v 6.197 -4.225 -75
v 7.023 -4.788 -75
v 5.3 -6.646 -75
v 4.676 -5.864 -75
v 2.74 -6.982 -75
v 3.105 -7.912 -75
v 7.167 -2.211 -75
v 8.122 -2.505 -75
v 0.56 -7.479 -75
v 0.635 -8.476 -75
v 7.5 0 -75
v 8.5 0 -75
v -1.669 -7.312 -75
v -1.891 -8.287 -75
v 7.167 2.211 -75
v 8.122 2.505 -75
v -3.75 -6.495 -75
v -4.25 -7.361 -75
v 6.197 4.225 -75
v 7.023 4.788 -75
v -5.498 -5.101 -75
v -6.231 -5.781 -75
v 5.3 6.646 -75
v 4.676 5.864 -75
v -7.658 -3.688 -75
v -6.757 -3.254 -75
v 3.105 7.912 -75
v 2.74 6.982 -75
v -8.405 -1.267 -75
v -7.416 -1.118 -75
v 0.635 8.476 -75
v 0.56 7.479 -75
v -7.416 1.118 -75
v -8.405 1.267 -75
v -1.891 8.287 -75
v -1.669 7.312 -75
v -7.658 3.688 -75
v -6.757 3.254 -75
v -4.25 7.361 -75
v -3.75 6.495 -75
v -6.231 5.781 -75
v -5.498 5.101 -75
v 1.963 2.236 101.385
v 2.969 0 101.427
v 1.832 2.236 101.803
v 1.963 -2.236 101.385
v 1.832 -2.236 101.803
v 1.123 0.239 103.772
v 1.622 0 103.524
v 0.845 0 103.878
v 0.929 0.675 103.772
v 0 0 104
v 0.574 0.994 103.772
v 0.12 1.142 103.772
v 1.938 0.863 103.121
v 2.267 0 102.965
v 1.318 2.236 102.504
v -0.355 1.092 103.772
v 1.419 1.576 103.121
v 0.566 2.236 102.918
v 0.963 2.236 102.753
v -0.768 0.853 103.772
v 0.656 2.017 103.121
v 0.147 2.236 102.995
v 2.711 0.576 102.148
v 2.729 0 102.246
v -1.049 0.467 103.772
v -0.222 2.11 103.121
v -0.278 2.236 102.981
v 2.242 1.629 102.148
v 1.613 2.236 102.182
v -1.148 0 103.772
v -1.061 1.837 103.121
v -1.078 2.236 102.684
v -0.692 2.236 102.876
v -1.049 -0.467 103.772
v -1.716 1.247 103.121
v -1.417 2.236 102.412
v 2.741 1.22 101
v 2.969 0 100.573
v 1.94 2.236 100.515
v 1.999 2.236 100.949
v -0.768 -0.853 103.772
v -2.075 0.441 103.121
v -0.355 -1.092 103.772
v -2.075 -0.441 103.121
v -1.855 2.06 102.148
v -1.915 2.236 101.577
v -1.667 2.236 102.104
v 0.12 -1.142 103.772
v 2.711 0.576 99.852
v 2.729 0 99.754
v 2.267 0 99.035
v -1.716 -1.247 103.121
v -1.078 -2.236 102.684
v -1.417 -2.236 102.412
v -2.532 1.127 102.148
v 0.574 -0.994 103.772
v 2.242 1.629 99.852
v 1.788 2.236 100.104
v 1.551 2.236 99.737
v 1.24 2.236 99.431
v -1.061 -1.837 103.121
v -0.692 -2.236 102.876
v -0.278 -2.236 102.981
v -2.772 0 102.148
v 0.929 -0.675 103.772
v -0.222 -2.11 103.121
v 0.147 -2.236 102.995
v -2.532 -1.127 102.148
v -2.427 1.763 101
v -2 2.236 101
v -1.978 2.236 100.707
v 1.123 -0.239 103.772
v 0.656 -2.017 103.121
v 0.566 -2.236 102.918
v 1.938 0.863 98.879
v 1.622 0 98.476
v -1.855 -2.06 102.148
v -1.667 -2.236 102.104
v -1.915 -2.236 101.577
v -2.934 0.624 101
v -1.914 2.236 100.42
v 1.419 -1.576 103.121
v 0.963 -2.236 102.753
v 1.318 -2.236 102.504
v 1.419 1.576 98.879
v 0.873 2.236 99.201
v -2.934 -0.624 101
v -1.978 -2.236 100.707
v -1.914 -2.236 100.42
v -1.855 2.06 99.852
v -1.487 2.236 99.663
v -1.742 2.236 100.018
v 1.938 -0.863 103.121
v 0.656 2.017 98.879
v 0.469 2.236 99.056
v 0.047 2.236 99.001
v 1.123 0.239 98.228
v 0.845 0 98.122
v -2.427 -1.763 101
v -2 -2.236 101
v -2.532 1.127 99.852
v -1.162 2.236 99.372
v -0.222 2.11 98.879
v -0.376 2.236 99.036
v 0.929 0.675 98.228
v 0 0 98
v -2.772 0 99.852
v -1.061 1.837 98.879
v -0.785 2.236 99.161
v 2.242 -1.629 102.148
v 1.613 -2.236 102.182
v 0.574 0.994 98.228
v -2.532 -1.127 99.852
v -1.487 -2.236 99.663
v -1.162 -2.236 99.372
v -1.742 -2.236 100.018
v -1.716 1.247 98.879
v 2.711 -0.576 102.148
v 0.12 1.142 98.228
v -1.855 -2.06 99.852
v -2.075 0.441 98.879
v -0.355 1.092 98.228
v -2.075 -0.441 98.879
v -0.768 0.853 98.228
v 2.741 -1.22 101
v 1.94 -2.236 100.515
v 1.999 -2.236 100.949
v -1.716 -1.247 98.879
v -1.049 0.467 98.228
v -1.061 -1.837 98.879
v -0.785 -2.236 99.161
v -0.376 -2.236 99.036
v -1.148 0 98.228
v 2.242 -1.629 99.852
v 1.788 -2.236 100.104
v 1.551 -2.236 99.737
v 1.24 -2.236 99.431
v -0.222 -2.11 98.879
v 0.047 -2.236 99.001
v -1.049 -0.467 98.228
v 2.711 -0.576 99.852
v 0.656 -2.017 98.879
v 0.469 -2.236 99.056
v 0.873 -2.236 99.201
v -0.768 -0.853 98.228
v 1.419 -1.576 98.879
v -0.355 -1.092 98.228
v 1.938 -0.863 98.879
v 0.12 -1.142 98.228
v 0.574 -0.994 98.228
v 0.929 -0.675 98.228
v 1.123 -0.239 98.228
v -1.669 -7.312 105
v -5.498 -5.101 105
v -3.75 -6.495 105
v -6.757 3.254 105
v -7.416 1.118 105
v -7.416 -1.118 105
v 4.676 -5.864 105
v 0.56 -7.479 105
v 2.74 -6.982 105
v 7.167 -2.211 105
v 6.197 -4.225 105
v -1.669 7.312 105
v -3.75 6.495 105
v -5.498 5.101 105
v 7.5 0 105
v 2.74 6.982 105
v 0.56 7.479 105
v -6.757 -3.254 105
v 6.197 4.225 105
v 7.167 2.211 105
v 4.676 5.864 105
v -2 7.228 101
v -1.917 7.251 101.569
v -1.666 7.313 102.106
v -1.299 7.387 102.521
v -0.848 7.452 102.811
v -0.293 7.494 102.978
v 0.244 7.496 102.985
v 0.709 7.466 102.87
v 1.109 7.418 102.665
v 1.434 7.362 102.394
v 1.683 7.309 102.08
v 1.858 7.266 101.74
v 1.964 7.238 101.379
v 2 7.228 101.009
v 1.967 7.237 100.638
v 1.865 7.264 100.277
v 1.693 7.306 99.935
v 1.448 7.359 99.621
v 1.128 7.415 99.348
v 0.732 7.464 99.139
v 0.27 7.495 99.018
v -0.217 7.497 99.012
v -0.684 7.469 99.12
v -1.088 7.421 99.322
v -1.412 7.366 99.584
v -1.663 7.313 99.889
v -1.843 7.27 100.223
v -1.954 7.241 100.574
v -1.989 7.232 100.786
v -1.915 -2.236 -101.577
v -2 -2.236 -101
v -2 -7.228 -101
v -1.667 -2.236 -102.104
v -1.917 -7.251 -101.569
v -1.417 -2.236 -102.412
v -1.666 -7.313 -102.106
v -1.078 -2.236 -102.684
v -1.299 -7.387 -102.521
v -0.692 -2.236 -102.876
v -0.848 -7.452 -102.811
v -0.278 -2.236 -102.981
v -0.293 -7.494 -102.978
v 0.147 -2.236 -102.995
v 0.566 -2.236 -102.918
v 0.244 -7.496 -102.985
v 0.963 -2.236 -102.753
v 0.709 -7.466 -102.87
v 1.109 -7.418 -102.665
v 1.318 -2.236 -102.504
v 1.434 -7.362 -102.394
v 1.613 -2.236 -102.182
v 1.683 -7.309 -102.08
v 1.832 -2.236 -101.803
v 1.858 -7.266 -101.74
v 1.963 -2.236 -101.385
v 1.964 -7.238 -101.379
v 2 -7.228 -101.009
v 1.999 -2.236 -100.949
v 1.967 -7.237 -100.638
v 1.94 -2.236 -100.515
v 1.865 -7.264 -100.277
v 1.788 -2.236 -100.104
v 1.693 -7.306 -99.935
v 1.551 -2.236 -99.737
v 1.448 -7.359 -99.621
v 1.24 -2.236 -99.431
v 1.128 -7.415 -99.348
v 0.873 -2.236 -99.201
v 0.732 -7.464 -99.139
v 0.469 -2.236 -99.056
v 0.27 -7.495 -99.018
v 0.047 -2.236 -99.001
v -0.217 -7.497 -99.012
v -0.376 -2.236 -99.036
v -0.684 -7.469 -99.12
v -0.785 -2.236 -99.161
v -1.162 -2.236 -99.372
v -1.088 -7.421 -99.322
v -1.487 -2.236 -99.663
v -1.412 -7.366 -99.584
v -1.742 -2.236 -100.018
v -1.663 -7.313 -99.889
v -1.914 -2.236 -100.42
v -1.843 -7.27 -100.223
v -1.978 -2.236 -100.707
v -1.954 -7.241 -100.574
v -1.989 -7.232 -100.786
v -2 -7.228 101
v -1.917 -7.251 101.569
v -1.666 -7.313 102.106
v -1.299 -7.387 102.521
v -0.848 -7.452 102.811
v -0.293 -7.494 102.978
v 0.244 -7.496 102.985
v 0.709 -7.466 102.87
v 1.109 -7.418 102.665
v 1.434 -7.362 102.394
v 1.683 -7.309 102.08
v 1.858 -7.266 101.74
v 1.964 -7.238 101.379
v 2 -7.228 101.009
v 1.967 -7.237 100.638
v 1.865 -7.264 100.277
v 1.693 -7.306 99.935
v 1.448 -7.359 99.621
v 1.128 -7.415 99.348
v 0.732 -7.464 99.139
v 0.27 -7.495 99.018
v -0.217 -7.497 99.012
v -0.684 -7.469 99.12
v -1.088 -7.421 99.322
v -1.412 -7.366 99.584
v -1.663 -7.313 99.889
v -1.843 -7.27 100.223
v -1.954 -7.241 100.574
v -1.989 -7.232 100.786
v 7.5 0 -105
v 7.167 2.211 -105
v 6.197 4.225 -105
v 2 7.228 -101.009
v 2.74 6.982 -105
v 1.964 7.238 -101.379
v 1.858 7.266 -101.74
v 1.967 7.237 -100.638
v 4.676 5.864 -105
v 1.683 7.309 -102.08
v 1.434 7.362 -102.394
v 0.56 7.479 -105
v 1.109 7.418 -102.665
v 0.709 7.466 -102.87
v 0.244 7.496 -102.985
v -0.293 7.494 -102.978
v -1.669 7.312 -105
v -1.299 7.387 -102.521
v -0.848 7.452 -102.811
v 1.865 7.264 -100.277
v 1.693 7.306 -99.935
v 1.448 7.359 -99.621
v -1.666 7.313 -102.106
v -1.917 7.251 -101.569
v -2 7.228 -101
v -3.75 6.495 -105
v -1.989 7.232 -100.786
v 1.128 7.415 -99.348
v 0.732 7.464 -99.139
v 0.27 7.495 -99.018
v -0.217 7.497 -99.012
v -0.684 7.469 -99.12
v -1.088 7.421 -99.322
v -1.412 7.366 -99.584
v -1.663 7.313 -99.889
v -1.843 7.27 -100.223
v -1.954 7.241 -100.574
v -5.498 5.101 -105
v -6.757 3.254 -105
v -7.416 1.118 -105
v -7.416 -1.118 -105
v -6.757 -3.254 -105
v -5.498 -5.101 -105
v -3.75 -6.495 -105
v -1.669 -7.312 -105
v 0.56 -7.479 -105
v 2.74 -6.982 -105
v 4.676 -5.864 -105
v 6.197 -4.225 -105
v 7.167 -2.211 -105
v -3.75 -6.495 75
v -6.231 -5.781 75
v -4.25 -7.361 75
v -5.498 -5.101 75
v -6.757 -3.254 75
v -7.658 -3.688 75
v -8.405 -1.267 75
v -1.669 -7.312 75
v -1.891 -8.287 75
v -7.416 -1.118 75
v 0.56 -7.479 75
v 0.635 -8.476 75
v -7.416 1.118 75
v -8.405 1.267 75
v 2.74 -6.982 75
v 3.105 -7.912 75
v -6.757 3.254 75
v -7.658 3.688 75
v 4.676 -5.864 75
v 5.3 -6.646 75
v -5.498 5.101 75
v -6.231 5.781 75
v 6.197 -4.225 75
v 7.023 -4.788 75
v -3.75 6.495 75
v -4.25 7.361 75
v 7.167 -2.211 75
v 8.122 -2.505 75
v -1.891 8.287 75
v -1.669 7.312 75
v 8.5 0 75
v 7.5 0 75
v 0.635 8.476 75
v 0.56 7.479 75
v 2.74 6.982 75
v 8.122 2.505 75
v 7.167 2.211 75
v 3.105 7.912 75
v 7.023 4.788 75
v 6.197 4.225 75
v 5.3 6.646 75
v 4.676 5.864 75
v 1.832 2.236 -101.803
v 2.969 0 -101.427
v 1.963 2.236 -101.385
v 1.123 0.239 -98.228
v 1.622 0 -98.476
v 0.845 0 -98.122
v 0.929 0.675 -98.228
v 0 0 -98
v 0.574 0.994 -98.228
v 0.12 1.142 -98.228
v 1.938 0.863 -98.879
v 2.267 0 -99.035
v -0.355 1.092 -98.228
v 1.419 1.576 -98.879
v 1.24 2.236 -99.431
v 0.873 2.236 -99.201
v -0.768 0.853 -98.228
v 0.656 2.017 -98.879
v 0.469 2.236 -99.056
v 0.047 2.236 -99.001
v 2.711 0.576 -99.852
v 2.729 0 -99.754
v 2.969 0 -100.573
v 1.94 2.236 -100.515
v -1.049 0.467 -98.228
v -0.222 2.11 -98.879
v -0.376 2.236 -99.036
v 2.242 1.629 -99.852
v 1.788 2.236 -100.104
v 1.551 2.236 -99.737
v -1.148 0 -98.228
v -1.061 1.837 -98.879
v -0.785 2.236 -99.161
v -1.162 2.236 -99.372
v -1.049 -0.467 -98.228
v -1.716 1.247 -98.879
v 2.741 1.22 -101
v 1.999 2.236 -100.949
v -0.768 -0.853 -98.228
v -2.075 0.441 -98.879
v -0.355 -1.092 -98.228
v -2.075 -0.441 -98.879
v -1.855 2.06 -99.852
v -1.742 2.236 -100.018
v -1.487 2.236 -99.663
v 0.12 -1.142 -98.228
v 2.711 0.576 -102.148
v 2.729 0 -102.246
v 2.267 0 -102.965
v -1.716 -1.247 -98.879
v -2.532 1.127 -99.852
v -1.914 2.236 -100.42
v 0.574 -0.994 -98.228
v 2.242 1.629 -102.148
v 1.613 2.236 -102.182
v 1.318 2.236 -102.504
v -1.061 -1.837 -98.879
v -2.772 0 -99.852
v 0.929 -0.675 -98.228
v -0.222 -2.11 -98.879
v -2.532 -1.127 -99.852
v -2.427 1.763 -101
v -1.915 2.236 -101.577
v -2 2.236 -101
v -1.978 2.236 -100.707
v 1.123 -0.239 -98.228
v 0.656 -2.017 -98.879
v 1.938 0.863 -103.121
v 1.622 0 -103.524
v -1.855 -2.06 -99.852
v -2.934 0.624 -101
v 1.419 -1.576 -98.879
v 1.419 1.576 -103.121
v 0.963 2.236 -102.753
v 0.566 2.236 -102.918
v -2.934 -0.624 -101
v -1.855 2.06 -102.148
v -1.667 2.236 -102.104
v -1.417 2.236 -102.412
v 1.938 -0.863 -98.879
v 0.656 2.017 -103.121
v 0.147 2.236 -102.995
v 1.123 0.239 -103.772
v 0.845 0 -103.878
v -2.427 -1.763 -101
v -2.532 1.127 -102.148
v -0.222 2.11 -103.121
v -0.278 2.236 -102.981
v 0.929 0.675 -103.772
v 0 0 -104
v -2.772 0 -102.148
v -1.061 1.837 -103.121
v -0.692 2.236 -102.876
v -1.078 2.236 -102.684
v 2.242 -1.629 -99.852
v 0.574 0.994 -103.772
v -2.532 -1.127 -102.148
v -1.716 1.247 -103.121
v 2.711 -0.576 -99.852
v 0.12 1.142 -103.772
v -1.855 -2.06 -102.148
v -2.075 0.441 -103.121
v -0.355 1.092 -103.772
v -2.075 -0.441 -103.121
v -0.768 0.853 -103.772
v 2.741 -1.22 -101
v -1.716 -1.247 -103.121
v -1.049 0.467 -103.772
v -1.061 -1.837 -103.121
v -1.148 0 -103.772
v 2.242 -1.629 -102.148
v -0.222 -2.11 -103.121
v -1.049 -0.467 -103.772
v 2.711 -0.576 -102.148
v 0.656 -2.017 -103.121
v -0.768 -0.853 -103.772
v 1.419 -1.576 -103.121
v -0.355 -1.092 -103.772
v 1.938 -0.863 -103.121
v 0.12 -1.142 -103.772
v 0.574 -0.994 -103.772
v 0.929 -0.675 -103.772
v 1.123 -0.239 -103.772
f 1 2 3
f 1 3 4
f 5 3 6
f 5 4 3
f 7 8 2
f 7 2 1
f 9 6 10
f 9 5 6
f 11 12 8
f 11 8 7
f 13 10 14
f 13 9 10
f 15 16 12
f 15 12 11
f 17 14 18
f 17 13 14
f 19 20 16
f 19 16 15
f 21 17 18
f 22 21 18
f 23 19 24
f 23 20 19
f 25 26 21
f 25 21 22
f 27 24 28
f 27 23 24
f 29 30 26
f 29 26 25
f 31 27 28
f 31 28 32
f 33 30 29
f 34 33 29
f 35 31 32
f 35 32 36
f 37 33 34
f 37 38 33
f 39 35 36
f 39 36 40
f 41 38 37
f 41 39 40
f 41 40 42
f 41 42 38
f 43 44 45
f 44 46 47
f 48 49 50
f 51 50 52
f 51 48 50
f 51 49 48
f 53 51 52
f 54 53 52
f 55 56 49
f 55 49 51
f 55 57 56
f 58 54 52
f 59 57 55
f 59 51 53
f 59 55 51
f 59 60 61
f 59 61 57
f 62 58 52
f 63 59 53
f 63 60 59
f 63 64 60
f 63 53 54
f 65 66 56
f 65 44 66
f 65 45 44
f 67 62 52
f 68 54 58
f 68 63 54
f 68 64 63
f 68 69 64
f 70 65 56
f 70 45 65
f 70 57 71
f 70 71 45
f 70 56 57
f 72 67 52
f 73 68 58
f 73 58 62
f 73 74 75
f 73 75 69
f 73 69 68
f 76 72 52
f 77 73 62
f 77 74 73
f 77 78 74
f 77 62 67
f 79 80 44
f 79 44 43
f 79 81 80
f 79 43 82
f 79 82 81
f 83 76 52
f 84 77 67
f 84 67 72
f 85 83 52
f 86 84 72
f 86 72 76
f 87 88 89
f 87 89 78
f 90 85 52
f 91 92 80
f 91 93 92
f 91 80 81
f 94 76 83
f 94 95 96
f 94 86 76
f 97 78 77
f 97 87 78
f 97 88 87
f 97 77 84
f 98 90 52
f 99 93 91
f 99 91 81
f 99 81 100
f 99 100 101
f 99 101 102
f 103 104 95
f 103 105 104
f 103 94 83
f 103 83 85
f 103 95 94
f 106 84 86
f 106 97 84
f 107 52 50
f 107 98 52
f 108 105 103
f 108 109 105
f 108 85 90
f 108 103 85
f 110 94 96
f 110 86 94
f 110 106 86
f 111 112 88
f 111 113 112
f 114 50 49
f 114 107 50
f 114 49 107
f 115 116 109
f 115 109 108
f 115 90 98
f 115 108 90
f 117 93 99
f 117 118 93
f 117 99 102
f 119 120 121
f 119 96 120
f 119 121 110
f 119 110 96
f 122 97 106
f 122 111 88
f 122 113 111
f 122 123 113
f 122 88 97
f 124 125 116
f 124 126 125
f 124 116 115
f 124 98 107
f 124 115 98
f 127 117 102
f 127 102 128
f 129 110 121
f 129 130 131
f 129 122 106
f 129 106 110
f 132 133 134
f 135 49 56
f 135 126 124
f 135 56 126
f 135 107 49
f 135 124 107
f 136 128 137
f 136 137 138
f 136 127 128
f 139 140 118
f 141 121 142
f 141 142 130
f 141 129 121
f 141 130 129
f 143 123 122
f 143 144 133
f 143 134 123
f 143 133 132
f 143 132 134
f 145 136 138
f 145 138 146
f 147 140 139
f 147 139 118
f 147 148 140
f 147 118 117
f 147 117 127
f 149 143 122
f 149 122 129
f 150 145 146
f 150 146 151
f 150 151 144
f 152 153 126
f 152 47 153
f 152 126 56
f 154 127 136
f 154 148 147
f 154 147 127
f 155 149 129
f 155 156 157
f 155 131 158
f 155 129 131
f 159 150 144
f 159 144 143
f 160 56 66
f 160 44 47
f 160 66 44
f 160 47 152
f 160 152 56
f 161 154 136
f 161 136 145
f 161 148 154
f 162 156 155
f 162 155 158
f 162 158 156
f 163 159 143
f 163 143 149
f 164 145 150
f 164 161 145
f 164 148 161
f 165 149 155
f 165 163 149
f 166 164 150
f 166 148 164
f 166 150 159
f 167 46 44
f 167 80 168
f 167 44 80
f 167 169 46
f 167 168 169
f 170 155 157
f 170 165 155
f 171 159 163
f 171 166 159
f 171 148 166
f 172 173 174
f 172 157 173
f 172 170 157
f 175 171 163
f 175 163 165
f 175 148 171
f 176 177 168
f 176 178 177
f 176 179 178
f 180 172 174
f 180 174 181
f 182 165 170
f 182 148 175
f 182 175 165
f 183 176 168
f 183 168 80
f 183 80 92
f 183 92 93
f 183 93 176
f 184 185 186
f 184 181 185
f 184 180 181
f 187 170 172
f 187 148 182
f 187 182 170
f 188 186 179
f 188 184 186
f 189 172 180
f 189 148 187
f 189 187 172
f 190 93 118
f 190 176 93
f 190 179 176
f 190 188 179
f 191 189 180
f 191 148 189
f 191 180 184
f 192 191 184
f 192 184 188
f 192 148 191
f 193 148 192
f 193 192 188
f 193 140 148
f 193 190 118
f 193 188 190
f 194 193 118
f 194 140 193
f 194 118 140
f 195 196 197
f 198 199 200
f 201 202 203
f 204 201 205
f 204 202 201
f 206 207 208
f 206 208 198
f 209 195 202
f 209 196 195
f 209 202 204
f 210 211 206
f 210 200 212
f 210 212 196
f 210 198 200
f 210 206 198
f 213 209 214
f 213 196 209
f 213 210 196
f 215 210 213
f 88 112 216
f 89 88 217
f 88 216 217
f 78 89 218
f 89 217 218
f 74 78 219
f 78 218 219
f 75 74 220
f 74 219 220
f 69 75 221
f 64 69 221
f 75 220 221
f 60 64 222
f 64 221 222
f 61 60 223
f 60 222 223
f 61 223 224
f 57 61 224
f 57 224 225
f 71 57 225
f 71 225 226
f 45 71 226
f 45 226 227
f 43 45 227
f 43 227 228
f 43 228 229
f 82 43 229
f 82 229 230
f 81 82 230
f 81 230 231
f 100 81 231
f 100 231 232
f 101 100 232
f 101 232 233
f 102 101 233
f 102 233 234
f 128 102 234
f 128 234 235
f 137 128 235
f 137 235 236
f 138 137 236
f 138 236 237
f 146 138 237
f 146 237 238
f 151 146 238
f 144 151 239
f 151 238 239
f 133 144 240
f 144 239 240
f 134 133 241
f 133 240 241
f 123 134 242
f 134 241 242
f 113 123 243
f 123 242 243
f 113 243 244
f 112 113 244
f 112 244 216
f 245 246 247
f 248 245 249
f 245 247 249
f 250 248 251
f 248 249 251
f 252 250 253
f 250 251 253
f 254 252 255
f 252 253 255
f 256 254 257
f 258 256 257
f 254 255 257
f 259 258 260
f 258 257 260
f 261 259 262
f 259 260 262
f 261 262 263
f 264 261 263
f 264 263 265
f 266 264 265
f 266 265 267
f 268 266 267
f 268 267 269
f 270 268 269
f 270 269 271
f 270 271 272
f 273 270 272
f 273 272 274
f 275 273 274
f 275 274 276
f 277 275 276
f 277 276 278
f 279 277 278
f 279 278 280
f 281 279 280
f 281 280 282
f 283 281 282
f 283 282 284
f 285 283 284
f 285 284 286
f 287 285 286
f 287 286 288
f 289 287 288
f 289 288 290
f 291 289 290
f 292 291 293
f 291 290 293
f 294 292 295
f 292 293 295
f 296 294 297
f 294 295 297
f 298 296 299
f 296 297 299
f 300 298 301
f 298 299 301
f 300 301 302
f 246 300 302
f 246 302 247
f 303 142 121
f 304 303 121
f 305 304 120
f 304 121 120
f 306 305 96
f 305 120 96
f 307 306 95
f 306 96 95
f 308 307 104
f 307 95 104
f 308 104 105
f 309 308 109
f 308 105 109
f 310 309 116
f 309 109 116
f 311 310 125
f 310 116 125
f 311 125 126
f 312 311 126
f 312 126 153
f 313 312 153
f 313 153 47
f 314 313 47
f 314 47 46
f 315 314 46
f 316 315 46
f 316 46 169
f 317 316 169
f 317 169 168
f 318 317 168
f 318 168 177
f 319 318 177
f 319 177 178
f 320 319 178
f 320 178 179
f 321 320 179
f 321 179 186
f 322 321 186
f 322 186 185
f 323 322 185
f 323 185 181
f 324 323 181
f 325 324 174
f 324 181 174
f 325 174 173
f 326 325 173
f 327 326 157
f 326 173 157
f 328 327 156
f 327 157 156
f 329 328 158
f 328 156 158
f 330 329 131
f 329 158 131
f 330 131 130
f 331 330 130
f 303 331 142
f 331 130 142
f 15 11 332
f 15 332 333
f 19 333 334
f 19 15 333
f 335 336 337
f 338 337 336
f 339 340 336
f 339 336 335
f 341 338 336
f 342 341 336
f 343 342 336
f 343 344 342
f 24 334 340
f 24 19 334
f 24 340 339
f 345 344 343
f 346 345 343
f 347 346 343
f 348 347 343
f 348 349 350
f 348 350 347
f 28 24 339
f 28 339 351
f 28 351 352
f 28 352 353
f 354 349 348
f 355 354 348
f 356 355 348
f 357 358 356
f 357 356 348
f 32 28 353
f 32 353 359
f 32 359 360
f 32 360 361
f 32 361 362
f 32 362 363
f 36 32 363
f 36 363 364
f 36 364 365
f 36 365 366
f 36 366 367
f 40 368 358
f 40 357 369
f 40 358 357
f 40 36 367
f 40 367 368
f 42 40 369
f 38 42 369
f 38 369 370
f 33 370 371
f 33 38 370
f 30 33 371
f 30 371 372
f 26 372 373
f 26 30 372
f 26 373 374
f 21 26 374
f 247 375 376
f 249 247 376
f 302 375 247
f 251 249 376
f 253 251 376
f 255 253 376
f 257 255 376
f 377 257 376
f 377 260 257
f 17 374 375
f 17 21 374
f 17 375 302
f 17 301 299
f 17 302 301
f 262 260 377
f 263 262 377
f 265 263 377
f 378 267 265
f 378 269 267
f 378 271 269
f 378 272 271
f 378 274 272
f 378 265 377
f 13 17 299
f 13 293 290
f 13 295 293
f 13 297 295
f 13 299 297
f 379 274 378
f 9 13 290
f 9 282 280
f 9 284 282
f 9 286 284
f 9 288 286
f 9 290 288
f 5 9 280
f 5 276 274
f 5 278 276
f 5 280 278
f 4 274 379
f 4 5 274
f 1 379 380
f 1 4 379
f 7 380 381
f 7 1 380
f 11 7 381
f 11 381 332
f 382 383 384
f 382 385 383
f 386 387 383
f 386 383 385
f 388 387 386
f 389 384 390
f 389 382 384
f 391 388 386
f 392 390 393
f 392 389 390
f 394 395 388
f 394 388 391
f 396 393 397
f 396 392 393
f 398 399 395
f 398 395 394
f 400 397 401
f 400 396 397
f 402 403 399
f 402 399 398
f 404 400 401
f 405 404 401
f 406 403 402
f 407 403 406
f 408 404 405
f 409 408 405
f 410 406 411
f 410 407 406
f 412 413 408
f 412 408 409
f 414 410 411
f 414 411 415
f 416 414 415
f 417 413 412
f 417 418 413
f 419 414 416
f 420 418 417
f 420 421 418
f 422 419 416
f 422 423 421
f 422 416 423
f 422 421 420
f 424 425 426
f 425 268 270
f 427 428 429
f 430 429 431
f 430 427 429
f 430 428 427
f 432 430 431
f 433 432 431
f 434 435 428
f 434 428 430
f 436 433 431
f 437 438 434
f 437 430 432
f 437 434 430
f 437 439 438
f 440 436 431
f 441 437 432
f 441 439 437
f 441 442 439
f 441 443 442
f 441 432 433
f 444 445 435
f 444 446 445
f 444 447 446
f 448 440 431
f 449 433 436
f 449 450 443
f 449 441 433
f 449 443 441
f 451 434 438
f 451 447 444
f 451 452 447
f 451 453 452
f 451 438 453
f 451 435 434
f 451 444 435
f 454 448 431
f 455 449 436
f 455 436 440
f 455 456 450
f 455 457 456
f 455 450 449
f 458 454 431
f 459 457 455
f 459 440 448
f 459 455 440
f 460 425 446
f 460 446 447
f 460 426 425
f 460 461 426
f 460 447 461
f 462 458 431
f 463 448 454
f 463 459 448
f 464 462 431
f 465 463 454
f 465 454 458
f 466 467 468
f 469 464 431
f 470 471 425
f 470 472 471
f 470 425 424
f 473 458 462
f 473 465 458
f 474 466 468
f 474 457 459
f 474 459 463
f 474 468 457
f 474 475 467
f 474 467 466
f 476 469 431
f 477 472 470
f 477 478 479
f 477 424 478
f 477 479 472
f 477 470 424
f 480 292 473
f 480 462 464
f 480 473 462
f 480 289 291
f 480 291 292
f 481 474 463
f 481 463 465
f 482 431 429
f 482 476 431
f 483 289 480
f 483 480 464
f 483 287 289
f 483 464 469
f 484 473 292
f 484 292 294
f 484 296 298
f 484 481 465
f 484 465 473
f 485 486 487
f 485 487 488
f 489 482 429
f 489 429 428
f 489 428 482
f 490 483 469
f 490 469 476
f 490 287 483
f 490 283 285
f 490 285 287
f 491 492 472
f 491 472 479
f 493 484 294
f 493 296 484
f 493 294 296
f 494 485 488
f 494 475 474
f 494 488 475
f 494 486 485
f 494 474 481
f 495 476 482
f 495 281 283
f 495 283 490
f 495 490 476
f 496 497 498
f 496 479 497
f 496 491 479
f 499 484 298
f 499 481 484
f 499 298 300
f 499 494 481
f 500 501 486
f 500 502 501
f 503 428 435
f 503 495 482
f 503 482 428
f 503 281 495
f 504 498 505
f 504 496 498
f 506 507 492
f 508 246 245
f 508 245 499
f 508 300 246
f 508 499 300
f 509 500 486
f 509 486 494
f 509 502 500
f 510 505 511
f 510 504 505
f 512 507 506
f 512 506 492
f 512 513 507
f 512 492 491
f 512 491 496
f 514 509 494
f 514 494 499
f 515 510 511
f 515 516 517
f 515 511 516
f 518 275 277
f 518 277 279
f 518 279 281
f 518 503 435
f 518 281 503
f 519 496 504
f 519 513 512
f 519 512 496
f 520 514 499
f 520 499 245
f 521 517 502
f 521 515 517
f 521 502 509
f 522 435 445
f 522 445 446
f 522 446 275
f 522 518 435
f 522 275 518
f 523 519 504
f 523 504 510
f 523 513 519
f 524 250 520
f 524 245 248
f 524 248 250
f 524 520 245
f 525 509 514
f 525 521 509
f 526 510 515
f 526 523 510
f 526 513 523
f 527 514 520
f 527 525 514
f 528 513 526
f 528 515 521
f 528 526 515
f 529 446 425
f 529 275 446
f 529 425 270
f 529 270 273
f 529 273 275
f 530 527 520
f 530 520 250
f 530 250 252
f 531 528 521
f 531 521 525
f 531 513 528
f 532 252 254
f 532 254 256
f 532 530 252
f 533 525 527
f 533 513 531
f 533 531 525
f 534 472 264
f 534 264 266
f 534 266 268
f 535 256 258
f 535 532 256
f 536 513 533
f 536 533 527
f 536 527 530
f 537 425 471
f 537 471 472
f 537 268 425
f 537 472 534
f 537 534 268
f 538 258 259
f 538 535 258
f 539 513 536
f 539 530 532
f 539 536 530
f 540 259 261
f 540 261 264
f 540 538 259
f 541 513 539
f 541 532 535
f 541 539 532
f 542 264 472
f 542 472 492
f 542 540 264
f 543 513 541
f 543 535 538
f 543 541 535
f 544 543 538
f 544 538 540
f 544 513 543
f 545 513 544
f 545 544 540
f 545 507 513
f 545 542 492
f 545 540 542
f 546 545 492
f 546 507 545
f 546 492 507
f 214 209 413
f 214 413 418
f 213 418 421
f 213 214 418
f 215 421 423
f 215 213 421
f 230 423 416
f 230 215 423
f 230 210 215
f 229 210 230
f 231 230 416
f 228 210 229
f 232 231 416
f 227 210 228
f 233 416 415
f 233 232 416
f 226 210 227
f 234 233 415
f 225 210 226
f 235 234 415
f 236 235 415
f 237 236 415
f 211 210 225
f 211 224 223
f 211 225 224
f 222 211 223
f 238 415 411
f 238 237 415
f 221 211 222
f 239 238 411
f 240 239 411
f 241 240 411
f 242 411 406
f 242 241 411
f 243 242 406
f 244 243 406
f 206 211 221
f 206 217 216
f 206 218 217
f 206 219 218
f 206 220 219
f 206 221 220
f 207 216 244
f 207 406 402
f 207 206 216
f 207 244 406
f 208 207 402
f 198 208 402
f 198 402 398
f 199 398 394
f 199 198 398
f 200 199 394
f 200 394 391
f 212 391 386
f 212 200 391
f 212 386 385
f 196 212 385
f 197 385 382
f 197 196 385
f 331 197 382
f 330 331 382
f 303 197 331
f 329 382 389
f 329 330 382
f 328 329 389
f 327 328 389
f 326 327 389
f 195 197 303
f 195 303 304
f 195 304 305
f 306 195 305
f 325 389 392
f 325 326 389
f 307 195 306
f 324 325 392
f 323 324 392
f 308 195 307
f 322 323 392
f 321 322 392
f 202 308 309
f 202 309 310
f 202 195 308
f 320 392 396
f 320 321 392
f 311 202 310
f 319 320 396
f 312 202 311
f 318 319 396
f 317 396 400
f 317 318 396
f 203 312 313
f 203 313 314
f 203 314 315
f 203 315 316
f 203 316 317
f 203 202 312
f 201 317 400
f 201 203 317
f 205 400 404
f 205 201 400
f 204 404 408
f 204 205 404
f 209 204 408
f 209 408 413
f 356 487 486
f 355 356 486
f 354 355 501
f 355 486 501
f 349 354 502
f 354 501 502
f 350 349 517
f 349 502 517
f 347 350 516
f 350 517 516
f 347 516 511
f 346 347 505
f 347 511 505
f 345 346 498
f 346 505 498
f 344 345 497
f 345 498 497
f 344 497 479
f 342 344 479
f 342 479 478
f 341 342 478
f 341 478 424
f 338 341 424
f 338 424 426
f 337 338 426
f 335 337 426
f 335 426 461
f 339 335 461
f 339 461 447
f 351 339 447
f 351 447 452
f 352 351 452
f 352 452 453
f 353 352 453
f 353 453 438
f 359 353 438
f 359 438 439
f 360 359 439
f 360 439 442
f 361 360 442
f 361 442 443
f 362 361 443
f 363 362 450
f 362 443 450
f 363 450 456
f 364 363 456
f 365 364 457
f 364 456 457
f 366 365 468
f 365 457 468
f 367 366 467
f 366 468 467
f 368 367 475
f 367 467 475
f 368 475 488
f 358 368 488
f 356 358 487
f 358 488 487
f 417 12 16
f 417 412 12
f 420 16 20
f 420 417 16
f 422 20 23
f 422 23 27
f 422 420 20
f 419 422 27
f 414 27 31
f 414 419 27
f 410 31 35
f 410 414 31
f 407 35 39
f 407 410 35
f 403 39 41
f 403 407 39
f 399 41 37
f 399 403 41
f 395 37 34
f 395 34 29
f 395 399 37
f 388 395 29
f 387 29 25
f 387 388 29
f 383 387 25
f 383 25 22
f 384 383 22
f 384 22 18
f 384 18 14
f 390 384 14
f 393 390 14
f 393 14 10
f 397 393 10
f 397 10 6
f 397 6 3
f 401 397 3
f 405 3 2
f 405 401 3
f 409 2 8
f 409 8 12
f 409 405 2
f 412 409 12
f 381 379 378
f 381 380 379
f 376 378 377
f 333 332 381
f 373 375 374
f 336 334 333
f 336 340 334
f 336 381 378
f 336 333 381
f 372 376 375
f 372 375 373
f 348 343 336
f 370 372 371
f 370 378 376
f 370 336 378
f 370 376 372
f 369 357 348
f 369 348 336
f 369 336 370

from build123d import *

# Parameters (mm, degrees)
F2_D     = 4
F3_D     = 4
F4_D     = 4
F4_DEPTH = 150
F5_D     = 4
F5_DEPTH = 150


with BuildPart() as f1:
    # F0 (on Front) → F1 (revolve)
    with BuildSketch(Plane.XZ):
        with BuildLine():
            Line((7.5, -75), (8.5, -75))
            Line((8.5, -75), (8.5, 75))
            Line((8.5, 75), (7.5, 75))
            Line((7.5, 75), (7.5, 105))
            Line((7.5, 105), (0, 105))
            Line((0, 105), (0, 104))
            ThreePointArc((0, 104), (3, 101), (0, 98))
            Line((0, 98), (0, -98))
            ThreePointArc((0, -98), (3, -101), (0, -104))
            Line((0, -104), (0, -105))
            Line((0, -105), (7.5, -105))
            Line((7.5, -105), (7.5, -75))
        make_face()
    revolve(axis=Axis((0, 0, 64.221174), (0, 0, 1)))

    # F2 (through all)
    with Locations(Plane.XZ):
        with Locations((0, 101)):
            Hole(F2_D / 2)

    # F3 (through all)
    with Locations(Plane(origin=(0, 0, 0), x_dir=(1, 0, 0), z_dir=(0, 1, 0))):
        with Locations((0, 101)):
            Hole(F3_D / 2)

    # F4
    with Locations(Plane(origin=(0, 0, 0), x_dir=(1, 0, 0), z_dir=(0, 1, 0))):
        with Locations((0, -101)):
            Hole(F4_D / 2, depth=F4_DEPTH)

    # F5
    with Locations(Plane.XZ):
        with Locations((0, -101)):
            Hole(F5_D / 2, depth=F5_DEPTH)


solid = f1.part
